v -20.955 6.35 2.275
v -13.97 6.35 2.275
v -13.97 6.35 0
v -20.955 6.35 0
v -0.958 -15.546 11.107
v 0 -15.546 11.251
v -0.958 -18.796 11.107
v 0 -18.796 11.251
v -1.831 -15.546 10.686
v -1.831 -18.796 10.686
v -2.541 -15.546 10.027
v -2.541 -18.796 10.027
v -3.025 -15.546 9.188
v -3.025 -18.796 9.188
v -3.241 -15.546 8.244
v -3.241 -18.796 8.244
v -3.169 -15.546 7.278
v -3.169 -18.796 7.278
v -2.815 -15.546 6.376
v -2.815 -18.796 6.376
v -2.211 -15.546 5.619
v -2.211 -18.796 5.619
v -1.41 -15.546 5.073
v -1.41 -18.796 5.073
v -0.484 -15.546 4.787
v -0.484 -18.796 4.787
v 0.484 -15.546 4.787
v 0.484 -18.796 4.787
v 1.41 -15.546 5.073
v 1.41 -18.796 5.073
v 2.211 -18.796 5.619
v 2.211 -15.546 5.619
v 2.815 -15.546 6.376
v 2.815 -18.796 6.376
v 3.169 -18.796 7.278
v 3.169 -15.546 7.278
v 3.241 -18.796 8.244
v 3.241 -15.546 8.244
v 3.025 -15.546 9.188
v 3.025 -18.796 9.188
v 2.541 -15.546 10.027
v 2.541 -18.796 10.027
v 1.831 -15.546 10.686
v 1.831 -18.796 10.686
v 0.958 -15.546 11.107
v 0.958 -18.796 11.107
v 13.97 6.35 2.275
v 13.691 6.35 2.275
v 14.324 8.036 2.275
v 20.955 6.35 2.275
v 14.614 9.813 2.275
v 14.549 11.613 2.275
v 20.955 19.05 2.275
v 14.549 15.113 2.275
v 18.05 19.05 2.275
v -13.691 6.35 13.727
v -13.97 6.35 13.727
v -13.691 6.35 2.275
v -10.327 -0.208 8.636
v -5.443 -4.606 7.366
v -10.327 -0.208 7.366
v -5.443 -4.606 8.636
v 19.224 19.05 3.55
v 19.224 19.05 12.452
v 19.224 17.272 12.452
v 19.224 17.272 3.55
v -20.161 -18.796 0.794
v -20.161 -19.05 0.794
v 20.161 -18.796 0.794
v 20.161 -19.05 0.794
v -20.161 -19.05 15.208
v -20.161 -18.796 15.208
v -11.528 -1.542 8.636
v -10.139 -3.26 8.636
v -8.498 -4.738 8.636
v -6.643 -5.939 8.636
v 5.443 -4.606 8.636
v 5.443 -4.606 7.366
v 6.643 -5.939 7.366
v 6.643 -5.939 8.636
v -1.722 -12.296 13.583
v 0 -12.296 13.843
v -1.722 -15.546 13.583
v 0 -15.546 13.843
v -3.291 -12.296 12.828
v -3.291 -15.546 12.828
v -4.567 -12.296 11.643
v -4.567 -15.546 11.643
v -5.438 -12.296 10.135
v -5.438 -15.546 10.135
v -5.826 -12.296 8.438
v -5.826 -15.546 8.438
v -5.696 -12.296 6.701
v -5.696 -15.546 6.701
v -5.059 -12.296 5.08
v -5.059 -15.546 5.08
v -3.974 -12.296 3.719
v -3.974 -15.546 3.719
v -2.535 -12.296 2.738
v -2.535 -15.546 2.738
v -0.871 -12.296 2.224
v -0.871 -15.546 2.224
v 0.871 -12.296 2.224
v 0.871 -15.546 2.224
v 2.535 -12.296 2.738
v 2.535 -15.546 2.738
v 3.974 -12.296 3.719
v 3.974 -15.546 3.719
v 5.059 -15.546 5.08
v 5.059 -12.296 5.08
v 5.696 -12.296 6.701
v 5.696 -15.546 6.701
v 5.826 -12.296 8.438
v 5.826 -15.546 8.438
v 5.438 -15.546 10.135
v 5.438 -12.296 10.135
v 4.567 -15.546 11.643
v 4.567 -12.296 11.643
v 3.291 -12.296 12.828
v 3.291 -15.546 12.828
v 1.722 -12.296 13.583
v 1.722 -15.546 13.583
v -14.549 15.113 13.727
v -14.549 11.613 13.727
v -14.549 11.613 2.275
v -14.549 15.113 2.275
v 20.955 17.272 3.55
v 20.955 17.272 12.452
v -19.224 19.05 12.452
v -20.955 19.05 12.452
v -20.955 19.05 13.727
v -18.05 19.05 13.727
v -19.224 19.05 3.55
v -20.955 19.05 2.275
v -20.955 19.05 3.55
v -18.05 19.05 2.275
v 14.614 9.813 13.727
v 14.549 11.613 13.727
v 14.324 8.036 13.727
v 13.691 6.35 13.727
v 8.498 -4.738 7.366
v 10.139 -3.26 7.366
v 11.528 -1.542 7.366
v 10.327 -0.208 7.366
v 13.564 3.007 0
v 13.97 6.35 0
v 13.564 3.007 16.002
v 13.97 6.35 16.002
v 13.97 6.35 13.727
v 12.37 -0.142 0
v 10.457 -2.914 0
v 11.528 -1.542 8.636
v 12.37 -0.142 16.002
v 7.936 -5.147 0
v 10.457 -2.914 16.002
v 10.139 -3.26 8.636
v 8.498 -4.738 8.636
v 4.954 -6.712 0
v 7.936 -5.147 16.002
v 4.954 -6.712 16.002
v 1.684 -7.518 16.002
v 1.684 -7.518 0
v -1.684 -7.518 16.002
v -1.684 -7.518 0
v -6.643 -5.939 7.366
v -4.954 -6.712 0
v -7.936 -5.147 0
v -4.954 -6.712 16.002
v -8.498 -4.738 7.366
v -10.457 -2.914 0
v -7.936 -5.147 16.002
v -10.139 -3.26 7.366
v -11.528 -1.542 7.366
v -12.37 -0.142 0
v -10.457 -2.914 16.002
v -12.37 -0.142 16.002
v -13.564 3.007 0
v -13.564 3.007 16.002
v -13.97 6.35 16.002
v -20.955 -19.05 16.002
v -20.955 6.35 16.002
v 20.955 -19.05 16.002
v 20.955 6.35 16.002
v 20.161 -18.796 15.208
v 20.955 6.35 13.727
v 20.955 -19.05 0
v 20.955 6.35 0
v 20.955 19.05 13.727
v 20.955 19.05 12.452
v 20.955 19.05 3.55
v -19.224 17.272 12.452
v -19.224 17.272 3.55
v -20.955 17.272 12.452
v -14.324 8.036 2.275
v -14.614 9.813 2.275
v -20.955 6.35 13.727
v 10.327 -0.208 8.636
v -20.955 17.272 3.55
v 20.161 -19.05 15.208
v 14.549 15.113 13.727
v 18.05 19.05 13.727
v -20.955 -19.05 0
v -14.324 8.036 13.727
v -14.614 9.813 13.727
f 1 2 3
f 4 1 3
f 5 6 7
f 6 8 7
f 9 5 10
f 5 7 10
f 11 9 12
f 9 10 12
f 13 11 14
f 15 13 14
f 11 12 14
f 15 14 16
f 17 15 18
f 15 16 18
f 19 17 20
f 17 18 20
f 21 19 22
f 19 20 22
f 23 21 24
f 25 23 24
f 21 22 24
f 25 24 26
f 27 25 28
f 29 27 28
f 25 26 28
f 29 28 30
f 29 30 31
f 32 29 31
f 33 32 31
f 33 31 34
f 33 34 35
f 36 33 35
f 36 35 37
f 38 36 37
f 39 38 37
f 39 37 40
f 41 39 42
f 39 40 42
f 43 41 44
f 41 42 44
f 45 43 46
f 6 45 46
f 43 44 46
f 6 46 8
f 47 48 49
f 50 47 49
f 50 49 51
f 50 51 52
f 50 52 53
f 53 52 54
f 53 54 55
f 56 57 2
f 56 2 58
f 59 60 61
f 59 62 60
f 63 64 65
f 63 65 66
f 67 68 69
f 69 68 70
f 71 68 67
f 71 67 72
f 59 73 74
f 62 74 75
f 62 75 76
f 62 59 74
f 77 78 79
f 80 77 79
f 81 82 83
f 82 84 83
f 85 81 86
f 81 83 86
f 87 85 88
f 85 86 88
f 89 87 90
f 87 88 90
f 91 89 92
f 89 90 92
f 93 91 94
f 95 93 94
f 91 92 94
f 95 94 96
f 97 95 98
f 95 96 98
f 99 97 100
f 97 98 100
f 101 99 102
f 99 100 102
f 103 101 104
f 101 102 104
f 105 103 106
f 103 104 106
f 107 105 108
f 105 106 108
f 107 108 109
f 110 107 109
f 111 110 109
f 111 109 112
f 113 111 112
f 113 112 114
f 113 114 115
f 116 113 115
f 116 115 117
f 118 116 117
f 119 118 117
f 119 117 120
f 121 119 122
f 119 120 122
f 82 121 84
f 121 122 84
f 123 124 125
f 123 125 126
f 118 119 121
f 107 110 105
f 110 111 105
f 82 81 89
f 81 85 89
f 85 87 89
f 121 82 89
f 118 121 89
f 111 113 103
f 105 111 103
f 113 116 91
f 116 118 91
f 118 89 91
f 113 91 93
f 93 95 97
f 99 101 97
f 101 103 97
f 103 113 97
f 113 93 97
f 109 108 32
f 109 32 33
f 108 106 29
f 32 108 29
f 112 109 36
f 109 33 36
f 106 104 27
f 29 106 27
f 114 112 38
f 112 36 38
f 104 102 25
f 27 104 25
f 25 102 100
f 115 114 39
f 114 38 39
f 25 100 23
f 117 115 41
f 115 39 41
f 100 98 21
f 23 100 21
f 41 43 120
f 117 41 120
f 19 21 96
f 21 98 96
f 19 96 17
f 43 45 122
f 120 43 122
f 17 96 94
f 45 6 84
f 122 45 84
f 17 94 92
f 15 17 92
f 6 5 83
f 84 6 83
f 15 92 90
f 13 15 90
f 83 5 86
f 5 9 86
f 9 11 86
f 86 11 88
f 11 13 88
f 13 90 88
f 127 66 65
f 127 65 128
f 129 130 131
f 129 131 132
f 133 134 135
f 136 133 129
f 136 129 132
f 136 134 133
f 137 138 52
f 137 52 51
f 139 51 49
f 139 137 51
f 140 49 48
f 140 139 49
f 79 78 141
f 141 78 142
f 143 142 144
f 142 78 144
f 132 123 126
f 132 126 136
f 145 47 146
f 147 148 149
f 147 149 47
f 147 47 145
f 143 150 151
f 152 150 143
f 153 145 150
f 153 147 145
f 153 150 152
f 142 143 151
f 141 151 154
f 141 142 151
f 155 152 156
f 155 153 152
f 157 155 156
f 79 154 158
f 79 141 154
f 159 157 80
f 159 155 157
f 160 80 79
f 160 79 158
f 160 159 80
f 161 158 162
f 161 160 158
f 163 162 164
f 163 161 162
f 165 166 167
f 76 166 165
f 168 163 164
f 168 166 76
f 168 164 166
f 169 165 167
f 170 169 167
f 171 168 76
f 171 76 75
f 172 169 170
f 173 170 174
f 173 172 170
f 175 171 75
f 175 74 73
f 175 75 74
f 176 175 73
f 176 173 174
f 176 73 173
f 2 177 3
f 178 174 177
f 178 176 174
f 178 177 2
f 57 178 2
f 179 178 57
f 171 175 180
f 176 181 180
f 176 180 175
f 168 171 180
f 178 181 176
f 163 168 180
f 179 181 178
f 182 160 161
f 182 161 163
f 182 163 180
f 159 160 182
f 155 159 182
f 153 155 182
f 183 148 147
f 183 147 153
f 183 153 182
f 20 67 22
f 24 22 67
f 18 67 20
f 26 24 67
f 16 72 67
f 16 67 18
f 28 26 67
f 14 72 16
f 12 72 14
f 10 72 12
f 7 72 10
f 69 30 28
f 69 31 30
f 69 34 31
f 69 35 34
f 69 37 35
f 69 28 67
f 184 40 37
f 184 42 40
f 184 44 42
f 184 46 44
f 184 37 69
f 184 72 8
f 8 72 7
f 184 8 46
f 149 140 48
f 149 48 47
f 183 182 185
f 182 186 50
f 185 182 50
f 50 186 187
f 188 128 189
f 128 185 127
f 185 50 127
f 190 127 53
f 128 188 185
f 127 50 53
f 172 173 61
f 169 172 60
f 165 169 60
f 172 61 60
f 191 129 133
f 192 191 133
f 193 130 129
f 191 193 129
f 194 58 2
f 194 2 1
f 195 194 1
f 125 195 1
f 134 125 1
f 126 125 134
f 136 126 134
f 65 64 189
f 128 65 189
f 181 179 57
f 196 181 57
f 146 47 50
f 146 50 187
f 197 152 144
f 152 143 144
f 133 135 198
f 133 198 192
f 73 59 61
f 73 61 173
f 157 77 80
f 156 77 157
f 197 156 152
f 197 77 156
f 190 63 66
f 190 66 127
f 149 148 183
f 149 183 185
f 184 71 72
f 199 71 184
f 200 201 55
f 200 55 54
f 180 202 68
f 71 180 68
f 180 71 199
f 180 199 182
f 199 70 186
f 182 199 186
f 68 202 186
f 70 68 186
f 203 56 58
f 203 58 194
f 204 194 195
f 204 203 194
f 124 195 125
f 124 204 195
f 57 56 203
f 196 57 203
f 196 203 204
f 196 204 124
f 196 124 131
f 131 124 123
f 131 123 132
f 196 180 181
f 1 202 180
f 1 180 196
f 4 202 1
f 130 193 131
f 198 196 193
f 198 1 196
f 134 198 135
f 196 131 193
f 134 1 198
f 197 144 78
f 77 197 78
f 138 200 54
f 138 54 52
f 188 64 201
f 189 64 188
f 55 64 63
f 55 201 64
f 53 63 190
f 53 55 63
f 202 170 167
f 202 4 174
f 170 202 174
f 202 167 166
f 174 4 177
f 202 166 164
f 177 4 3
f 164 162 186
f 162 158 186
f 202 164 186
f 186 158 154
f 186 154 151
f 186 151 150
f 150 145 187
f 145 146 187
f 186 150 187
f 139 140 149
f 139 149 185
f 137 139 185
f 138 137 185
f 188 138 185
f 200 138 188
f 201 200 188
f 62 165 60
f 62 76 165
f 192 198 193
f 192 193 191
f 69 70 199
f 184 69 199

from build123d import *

# Parameters (mm, degrees)
SKETCH1_W               = 41.91
SKETCH1_H               = 38.1
EXTRUDE1_DEPTH          = 16.002
CUT_EXTRUDE1_DEPTH      = 17.002
SKETCH3_W               = 2.27457
SKETCH3_H               = 12.7
CUT_EXTRUDE2_DEPTH      = 21.955
CUT_EXTRUDE2_DEPTH_BACK = 21.955
SKETCH4_W               = 40.3225
SKETCH4_H               = 14.4145
CUT_EXTRUDE3_DEPTH      = 0.254
SKETCH5_W               = 1.731382872
SKETCH5_H               = 8.90143
CUT_EXTRUDE4_DEPTH      = 1.778
EXTRUDE2_DEPTH          = 0.635


with BuildPart() as part:
    # Sketch1 → Extrude1 (new body)
    with BuildSketch(Plane.XY):
        Rectangle(SKETCH1_W, SKETCH1_H)
    extrude(amount=EXTRUDE1_DEPTH)

    # Sketch2 → Cut-Extrude1 (cut, through all)
    with BuildSketch(Plane.XY.offset(16.002)):
        with BuildLine():
            Line((-13.97, 6.35), (-13.6906, 6.35))
            ThreePointArc((-13.6906, 6.35), (-14.51249132, 8.917230674), (-14.5494375, 11.6125625))
            Line((-14.5494375, 11.6125625), (-14.5494375, 15.113))
            Line((-14.5494375, 15.113), (-18.049875, 19.05))
            Line((-18.049875, 19.05), (18.049875, 19.05))
            Line((18.049875, 19.05), (14.5494375, 15.113))
            Line((14.5494375, 15.113), (14.5494375, 11.6125625))
            ThreePointArc((14.5494375, 11.6125625), (14.51249132, 8.917230674), (13.6906, 6.35))
            Line((13.6906, 6.35), (13.97, 6.35))
            ThreePointArc((13.97, 6.35), (0, -7.62), (-13.97, 6.35))
        make_face()
    extrude(amount=-CUT_EXTRUDE1_DEPTH, mode=Mode.SUBTRACT)

    # Sketch3 → Cut-Extrude2 (cut, two sides)
    with BuildSketch(Plane(origin=(0, 0, 0), x_dir=(0, 0, -1), z_dir=(1, 0, 0))) as cut_extrude2_sk:
        with Locations((-14.864715, 12.7)):
            Rectangle(SKETCH3_W, SKETCH3_H)
        with Locations((-1.137285, 12.7)):
            Rectangle(SKETCH3_W, SKETCH3_H)
    extrude(amount=CUT_EXTRUDE2_DEPTH, mode=Mode.SUBTRACT)
    extrude(cut_extrude2_sk.sketch, amount=-CUT_EXTRUDE2_DEPTH_BACK, mode=Mode.SUBTRACT)

    # Sketch4 → Cut-Extrude3 (cut)
    with BuildSketch(Plane.XZ.offset(19.05)):
        with Locations((0, 8.001)):
            Rectangle(SKETCH4_W, SKETCH4_H)
    extrude(amount=-CUT_EXTRUDE3_DEPTH, mode=Mode.SUBTRACT)

    # Sketch5 → Cut-Extrude4 (cut)
    with BuildSketch(Plane(origin=(0, 19.05, 0), x_dir=(1, 0, 0), z_dir=(0, 1, 0))):
        with Locations((-20.089308564, -8.001)):
            Rectangle(SKETCH5_W, SKETCH5_H)
        with Locations((20.089308564, -8.001)):
            Rectangle(SKETCH5_W, SKETCH5_H)
    extrude(amount=-CUT_EXTRUDE4_DEPTH, mode=Mode.SUBTRACT)

    # Sketch6 → Cut-Revolve1 (revolve, cut)
    with BuildSketch(Plane(origin=(0, 0, 8.001), x_dir=(-1, 0, 0), z_dir=(0, 0, -1)), mode=Mode.PRIVATE) as cut_revolve1_sk:
        Polygon((3.25, -18.796), (0, -18.796), (0, -12.296), (5.842, -12.296), (5.842, -15.546), (3.25, -15.546), align=None)
    revolve(cut_revolve1_sk.sketch.rotate(Axis((0, 0, 8.001), (0, -1, 0)), 270), axis=Axis((0, 0, 8.001), (0, -1, 0)), mode=Mode.SUBTRACT)  # turned: the seam where the file's is

    # Sketch7 → Extrude2 (add, symmetric)
    with BuildSketch(Plane(origin=(0, 0, 8.001), x_dir=(-1, 0, 0), z_dir=(0, 0, -1))):
        with BuildLine():
            Line((5.443056808, -4.606163762), (10.327190387, -0.208470134))
            Line((10.327190387, -0.208470134), (11.527527053, -1.541579058))
            ThreePointArc((11.527527053, -1.541579058), (9.347754571, -4.031733212), (6.643393474, -5.939272686))
            Line((6.643393474, -5.939272686), (5.443056808, -4.606163762))
        make_face()
        with BuildLine():
            Line((-5.443056808, -4.606163762), (-6.643393474, -5.939272686))
            ThreePointArc((-6.643393474, -5.939272686), (-9.347754571, -4.031733212), (-11.527527053, -1.541579058))
            Line((-11.527527053, -1.541579058), (-10.327190387, -0.208470134))
            Line((-10.327190387, -0.208470134), (-5.443056808, -4.606163762))
        make_face()
    extrude(amount=EXTRUDE2_DEPTH, both=True)


solid = part.part
